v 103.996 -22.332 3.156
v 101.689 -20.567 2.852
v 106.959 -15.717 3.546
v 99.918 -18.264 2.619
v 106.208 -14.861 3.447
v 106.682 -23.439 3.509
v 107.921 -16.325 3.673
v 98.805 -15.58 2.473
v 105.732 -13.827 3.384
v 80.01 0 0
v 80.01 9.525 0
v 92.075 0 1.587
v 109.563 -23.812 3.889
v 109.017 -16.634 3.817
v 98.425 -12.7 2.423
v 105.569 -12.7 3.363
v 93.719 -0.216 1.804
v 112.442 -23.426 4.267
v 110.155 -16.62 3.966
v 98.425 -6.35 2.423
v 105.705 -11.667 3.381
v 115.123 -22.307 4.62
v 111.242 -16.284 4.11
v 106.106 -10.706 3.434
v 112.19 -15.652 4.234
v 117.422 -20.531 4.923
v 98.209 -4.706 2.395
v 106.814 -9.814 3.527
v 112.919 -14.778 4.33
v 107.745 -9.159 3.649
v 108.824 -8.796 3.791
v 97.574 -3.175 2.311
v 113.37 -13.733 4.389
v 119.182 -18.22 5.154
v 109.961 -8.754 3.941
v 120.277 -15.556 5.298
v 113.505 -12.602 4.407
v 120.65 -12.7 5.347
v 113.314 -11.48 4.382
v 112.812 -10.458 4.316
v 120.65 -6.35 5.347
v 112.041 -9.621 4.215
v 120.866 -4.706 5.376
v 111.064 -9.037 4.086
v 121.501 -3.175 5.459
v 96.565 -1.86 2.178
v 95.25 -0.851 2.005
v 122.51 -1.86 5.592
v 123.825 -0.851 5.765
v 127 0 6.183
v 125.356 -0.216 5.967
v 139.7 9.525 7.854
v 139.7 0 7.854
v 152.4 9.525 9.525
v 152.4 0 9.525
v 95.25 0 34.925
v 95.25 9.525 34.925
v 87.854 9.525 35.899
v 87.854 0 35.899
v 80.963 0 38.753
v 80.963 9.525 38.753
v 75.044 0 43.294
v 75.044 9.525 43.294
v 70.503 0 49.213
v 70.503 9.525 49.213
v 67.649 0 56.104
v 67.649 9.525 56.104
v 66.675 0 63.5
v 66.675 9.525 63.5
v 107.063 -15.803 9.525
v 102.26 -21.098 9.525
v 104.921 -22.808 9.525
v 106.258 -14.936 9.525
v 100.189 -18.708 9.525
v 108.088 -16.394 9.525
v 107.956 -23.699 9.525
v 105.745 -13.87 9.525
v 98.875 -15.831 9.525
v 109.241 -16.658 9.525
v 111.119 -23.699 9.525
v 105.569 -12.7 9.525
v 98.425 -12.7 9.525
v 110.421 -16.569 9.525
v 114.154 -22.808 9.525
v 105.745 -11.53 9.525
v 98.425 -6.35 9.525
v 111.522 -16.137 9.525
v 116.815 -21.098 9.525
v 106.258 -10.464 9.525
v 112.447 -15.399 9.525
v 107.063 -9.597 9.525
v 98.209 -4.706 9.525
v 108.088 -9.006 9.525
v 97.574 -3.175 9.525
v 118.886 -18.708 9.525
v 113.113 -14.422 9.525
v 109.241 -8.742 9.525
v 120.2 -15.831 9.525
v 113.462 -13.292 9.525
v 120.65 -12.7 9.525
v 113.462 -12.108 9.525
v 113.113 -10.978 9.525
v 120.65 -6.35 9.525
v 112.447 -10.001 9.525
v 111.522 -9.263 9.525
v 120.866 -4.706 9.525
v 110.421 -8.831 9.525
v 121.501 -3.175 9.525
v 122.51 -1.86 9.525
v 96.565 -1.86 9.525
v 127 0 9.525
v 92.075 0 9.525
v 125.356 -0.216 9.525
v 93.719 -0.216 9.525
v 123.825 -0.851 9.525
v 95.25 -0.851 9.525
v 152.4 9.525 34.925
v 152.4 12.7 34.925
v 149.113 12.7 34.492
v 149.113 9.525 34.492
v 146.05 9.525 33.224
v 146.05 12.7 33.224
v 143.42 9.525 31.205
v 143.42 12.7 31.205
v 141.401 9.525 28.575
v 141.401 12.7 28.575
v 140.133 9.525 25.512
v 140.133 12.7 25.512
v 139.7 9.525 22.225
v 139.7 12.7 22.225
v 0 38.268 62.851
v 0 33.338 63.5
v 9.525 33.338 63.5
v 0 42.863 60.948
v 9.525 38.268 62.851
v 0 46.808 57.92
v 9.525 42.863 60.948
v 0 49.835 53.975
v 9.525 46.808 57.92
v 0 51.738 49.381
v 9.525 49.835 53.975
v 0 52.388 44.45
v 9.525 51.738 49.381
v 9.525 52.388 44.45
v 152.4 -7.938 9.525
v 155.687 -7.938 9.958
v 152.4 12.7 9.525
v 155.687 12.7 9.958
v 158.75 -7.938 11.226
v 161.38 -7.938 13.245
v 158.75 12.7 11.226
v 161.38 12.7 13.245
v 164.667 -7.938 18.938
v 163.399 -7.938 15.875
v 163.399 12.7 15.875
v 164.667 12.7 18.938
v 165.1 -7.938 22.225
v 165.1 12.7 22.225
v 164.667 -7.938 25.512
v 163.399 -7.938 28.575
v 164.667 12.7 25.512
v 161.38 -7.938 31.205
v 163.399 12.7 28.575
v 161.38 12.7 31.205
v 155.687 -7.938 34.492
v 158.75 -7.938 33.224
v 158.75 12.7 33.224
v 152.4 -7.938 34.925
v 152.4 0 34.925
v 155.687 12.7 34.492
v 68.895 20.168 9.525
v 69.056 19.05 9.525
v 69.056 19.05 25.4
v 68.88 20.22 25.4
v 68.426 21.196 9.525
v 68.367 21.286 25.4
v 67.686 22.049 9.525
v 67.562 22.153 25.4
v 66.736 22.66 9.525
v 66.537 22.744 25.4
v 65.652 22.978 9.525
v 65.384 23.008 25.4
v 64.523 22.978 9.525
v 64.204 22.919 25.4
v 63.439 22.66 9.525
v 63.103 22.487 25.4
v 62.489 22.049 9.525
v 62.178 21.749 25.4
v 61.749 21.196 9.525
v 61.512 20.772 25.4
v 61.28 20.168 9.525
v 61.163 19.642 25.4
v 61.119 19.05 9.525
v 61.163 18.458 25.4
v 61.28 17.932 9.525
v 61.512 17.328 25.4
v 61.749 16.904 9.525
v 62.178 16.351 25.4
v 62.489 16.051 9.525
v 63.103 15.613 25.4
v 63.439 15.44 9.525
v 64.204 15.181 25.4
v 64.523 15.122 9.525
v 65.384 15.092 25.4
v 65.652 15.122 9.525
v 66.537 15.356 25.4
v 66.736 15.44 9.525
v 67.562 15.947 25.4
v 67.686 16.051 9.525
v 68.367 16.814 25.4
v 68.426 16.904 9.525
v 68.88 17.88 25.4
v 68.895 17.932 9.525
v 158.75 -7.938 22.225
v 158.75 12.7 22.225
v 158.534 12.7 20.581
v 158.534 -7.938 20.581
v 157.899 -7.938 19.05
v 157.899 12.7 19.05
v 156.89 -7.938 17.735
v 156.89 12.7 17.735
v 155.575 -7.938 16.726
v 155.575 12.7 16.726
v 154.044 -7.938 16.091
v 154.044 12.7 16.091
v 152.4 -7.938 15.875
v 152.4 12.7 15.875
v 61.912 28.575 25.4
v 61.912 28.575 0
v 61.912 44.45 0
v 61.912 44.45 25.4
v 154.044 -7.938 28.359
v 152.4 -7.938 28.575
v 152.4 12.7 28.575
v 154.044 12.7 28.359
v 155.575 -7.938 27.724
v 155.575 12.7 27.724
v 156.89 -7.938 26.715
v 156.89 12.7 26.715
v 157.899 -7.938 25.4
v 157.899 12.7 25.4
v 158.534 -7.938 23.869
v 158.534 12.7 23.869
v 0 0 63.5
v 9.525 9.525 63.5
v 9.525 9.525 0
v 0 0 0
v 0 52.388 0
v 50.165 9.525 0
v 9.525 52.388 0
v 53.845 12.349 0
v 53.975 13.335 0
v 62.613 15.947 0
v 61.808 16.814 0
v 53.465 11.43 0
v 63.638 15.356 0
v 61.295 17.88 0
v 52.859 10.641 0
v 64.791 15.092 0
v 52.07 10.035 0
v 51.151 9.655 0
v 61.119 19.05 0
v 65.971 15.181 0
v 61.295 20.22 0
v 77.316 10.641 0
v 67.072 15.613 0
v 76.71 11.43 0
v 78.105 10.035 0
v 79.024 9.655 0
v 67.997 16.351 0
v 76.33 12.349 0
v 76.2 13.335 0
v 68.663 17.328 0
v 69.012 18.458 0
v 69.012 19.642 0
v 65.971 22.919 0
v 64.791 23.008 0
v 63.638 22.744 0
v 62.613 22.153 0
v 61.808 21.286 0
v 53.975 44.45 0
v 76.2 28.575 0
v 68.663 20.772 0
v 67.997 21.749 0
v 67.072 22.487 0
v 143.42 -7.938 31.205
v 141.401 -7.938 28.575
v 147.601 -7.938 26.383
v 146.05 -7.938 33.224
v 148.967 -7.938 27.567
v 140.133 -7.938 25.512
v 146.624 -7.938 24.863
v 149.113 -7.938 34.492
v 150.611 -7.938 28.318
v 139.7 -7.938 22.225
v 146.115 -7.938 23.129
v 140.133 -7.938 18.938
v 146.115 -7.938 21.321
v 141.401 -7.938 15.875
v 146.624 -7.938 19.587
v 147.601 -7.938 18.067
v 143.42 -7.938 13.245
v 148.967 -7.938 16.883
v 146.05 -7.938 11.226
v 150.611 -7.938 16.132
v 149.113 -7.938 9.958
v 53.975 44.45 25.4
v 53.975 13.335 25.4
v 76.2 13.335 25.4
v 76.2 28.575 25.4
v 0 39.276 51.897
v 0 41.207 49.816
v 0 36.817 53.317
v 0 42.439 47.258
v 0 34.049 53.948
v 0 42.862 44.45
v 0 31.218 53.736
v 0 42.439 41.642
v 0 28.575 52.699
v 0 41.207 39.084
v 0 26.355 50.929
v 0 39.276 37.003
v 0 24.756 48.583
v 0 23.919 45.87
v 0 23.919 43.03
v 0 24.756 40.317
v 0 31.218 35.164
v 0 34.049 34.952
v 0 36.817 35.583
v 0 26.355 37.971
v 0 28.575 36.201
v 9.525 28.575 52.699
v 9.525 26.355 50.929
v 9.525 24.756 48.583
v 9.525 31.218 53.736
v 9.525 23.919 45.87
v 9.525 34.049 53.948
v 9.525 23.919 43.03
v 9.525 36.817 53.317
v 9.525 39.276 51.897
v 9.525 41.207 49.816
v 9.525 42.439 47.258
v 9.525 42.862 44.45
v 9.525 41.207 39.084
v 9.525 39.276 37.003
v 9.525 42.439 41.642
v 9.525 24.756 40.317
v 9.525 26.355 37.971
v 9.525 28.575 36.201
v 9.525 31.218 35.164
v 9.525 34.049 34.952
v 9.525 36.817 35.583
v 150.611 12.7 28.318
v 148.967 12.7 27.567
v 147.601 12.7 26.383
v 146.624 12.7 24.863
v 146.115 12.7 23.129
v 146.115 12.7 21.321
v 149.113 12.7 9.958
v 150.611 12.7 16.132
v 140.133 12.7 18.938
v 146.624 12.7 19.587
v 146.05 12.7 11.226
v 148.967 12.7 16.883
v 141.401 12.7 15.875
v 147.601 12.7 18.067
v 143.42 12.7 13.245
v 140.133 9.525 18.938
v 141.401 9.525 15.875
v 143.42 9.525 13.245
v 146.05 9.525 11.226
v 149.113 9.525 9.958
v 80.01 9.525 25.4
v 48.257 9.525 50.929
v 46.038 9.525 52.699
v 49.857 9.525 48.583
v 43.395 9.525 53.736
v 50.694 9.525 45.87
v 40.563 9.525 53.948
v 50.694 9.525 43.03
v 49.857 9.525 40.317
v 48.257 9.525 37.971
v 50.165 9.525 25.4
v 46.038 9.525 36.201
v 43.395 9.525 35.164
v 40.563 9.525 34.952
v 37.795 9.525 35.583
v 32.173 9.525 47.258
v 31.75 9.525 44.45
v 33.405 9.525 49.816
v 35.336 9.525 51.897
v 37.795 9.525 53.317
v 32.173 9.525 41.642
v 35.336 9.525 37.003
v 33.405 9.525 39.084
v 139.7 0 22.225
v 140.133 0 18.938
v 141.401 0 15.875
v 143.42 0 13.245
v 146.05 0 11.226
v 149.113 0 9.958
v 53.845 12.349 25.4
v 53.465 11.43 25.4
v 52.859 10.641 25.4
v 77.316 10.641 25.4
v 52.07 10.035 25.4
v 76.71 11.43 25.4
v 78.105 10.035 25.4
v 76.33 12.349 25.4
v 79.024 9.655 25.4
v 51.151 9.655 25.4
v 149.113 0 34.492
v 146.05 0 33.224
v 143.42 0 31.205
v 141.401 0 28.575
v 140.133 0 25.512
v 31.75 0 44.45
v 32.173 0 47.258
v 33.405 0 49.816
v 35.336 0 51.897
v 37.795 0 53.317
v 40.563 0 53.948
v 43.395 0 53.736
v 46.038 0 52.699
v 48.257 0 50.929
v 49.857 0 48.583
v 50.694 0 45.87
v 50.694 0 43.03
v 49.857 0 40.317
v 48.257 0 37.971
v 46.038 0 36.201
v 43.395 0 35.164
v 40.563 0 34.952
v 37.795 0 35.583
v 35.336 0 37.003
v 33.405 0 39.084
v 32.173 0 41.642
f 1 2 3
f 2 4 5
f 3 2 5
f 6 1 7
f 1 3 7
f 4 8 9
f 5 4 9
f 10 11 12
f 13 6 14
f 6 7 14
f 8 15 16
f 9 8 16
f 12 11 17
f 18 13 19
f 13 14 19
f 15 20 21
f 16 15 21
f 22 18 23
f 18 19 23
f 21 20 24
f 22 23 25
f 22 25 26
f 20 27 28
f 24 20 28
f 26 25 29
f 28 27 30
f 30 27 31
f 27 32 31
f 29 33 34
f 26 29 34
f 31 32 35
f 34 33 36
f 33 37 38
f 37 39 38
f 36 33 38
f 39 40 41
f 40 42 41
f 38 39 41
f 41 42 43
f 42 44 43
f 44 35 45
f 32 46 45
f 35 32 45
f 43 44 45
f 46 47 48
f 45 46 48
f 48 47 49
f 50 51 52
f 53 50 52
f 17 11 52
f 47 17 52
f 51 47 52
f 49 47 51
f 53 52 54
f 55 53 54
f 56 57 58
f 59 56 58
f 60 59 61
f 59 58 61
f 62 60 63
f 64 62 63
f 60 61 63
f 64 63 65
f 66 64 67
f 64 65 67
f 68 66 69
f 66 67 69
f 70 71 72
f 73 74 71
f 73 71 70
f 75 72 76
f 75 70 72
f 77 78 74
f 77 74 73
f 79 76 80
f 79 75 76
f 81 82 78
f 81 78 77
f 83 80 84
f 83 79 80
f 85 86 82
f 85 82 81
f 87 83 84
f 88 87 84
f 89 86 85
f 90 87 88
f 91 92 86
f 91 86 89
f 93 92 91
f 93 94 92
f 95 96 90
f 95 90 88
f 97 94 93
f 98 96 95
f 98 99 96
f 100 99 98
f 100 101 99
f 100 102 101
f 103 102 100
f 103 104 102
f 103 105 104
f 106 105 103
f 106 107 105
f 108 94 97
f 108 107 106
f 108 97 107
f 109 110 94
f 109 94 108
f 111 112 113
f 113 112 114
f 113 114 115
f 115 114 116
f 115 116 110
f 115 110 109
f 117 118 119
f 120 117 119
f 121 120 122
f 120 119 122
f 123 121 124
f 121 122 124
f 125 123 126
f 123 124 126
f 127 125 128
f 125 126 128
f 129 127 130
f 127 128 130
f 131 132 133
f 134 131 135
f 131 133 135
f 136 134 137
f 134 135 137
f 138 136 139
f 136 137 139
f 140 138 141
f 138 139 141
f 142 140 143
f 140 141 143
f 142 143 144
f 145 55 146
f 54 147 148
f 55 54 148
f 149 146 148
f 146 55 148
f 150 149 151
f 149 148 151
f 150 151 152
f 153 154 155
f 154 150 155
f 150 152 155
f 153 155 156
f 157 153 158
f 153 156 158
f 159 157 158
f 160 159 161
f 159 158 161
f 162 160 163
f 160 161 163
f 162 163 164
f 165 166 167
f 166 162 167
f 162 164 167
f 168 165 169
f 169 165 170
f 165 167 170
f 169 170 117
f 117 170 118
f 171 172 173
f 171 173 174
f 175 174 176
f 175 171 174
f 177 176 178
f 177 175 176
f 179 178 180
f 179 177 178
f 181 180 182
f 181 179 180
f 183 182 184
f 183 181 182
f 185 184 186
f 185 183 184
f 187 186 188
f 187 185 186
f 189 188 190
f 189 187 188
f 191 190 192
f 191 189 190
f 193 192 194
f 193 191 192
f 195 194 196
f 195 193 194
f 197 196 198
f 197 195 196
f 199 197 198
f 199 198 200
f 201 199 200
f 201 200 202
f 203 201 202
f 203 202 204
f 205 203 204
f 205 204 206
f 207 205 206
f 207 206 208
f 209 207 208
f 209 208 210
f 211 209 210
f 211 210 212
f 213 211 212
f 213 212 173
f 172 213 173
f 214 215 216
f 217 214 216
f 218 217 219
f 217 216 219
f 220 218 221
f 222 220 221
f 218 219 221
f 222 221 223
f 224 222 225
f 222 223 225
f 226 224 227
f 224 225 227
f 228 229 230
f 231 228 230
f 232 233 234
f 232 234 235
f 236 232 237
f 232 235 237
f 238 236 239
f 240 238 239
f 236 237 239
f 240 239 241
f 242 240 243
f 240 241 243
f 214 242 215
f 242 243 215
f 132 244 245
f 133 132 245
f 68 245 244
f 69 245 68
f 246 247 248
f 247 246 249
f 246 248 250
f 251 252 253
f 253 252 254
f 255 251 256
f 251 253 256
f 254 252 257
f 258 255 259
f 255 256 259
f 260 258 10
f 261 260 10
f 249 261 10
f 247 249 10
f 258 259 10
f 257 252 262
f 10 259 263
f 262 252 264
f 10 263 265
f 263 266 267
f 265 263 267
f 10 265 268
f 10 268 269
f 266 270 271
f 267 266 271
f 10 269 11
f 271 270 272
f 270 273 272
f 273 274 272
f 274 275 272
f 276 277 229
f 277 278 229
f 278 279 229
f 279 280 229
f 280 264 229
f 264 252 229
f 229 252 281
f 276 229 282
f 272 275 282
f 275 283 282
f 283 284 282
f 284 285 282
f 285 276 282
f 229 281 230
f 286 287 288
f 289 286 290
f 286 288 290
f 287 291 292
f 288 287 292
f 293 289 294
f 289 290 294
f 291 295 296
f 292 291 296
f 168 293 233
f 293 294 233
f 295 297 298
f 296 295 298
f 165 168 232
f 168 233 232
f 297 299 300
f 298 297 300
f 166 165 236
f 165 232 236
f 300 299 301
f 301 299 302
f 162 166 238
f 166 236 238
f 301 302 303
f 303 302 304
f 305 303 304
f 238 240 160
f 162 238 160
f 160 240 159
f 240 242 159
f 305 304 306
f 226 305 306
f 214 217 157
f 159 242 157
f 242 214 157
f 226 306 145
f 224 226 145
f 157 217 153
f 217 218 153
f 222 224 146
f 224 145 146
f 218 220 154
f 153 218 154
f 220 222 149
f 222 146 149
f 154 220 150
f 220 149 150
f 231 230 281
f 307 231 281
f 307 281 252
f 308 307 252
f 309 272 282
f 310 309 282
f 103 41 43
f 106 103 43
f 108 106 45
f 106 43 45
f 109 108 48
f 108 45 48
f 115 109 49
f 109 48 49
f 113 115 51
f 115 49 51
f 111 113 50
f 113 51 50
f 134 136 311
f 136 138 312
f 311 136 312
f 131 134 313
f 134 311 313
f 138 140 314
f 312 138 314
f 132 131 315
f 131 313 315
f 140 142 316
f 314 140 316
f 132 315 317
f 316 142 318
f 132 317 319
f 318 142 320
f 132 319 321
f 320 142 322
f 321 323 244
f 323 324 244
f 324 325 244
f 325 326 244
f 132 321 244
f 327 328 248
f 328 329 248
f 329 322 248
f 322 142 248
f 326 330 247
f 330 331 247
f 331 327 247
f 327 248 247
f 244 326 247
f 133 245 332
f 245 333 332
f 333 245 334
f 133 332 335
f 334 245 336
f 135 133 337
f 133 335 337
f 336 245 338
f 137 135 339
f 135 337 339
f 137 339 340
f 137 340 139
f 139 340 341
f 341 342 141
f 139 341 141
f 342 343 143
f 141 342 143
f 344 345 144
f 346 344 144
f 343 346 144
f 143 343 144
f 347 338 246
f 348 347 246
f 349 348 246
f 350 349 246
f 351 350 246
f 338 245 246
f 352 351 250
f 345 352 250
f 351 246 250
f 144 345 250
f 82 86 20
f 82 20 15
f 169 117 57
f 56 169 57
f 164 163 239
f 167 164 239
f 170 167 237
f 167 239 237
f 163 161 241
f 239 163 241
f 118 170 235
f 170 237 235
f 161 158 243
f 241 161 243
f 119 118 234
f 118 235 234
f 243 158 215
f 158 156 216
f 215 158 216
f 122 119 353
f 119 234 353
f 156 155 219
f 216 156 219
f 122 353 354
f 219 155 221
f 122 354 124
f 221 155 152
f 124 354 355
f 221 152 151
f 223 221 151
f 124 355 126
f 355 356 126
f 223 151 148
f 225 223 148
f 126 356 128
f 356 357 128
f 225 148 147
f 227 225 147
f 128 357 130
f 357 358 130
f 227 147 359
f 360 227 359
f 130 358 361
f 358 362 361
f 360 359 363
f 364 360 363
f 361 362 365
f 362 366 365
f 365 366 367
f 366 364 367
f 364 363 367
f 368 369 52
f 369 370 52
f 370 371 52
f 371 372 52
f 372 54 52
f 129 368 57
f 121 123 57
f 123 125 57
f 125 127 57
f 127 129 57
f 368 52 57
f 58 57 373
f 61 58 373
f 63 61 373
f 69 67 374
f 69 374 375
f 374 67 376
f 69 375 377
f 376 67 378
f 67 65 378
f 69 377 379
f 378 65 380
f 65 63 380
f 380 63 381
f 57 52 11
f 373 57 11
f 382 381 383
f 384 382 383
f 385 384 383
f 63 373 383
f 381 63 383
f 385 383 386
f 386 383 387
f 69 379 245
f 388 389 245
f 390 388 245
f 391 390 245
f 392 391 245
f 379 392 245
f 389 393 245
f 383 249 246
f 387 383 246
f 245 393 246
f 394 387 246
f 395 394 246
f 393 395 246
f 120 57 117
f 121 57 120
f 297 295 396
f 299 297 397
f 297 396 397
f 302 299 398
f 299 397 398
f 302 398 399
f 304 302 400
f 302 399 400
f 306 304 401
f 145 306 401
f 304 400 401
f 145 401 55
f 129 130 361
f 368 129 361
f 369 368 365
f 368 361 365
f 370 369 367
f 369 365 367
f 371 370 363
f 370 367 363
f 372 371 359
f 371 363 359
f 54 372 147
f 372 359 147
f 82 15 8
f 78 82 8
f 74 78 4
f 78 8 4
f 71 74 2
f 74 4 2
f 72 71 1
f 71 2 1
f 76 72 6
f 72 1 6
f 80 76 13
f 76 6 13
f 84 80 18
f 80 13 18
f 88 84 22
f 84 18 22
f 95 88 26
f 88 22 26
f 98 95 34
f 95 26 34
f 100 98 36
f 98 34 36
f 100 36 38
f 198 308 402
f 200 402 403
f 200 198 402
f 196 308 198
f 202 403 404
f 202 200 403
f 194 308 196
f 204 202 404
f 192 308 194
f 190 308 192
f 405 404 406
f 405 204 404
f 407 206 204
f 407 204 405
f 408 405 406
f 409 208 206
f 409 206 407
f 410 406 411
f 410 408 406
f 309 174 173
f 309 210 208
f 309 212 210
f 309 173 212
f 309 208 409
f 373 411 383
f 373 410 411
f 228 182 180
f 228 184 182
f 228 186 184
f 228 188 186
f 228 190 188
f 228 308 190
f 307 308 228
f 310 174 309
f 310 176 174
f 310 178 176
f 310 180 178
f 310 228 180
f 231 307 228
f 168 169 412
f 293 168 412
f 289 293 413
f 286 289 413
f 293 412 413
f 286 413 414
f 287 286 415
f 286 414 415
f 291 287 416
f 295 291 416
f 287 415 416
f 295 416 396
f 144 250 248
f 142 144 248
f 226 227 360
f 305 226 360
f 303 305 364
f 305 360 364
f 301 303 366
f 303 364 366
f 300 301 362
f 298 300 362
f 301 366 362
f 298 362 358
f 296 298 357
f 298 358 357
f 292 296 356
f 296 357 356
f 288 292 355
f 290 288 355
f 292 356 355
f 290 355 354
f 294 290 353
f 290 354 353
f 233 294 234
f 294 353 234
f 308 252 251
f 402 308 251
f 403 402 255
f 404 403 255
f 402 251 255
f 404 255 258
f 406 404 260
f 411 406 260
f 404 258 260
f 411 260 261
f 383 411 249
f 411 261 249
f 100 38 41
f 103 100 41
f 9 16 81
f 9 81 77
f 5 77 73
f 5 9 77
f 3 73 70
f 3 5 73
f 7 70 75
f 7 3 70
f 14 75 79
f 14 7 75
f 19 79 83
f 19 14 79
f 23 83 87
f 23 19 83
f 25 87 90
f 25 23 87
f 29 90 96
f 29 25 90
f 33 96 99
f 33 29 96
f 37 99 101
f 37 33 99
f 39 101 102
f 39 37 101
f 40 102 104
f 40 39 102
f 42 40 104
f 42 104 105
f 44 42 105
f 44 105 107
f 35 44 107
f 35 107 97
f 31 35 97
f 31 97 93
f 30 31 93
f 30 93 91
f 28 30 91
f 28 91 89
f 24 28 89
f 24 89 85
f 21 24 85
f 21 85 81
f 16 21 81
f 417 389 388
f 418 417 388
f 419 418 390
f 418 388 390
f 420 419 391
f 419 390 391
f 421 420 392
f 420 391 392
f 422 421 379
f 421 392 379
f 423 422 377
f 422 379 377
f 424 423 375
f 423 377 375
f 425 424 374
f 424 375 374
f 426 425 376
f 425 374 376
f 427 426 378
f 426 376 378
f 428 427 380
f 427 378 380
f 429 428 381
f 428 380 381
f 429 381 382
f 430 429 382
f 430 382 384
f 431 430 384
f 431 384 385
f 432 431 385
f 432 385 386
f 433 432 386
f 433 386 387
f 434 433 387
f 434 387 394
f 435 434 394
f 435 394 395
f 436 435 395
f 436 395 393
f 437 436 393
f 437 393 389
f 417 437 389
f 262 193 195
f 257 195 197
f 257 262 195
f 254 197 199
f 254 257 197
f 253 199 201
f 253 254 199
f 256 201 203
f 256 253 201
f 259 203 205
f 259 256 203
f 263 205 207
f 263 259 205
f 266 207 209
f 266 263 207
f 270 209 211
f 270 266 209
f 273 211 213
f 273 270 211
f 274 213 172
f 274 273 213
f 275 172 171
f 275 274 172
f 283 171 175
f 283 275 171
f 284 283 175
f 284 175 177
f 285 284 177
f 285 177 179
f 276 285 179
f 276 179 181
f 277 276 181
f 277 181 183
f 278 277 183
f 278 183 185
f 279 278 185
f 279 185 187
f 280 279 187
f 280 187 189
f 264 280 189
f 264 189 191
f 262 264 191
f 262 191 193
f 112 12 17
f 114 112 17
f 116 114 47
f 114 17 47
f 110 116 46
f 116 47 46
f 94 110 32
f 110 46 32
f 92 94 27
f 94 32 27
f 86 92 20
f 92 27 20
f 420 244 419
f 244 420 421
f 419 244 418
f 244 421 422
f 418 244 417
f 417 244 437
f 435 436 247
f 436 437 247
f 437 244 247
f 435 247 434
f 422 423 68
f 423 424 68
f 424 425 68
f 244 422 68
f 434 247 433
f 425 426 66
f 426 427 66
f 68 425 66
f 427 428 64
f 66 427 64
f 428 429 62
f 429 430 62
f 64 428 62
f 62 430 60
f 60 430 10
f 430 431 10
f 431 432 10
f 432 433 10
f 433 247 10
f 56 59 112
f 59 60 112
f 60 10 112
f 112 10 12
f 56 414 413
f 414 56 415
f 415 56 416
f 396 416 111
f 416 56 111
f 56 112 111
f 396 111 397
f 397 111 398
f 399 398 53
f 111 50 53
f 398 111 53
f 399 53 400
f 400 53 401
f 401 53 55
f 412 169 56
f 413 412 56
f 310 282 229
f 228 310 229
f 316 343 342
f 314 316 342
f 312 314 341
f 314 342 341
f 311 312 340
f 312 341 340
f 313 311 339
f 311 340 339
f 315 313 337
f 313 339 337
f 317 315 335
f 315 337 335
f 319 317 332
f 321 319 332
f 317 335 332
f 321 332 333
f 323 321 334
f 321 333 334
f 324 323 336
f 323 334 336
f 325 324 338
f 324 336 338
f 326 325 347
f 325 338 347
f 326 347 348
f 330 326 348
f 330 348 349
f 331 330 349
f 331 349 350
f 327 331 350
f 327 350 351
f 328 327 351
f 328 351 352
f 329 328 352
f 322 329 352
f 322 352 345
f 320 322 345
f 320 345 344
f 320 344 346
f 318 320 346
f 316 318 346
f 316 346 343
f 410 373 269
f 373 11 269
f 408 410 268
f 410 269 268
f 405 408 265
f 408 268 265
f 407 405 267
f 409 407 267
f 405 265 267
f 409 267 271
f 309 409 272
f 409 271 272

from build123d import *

# Parameters (mm, degrees)
SKETCH1_R               = 3.96875
BOSS_EXTRUDE1_DEPTH     = 9.525
BOSS_EXTRUDE4_START     = 9.525
BOSS_EXTRUDE4_OUTLINE_R = 3.96875
BOSS_EXTRUDE4_DEPTH     = 15.875
BOSS_EXTRUDE5_START     = 25.4
BOSS_EXTRUDE5_DEPTH     = 38.1
SKETCH4_R               = 9.525
CUT_EXTRUDE1_DEPTH      = 177.01216089
SKETCH2_R               = 9.525
SKETCH2_W               = 12.7
SKETCH2_H               = 28.575
CUT_EXTRUDE2_DEPTH      = 182.288051609
CUT_EXTRUDE3_DEPTH      = 3.175
CUT_EXTRUDE4_START      = -12.7
CUT_EXTRUDE4_DEPTH      = 7.9375


# Read off the part's stored shape, not the designer's step: Boss-Extrude4, Boss-Extrude5
with BuildPart() as part:
    # Sketch1 → Boss-Extrude1 (new body)
    with BuildSketch(Plane.XY):
        with BuildLine():
            Line((0, 0), (92.075, 0))
            ThreePointArc((92.075, 0), (96.565128061, -1.859871939), (98.425, -6.35))
            Line((98.425, -6.35), (98.425, -12.7))
            ThreePointArc((98.425, -12.7), (109.5375, -23.8125), (120.65, -12.7))
            Line((120.65, -12.7), (120.65, -6.35))
            ThreePointArc((120.65, -6.35), (122.509871939, -1.859871939), (127, 0))
            Line((127, 0), (139.7, 0))
            Line((139.7, 0), (139.7, -7.9375))
            Line((139.7, -7.9375), (165.1, -7.9375))
            Line((165.1, -7.9375), (165.1, 12.7))
            Line((165.1, 12.7), (139.7, 12.7))
            Line((139.7, 12.7), (139.7, 9.525))
            Line((139.7, 9.525), (80.01, 9.525))
            ThreePointArc((80.01, 9.525), (77.315923164, 10.640923164), (76.2, 13.335))
            Line((76.2, 13.335), (76.2, 28.575))
            Line((76.2, 28.575), (61.9125, 28.575))
            Line((61.9125, 28.575), (61.9125, 44.45))
            Line((61.9125, 44.45), (53.975, 44.45))
            Line((53.975, 44.45), (53.975, 13.335))
            ThreePointArc((53.975, 13.335), (52.859076836, 10.640923164), (50.165, 9.525))
            Line((50.165, 9.525), (9.525, 9.525))
            Line((9.525, 9.525), (9.525, 52.3875))
            Line((9.525, 52.3875), (0, 52.3875))
            Line((0, 52.3875), (0, 0))
        make_face()
        with Locations(Location((109.5375, -12.7, 0), (0, 0, 180))):
            Circle(SKETCH1_R, mode=Mode.SUBTRACT)
        with Locations(Location((65.0875, 19.05, 0), (0, 0, 180))):
            Circle(SKETCH1_R, mode=Mode.SUBTRACT)
    extrude(amount=BOSS_EXTRUDE1_DEPTH)

    # Boss-Extrude4 outline → Boss-Extrude4 (add)
    with BuildSketch(Plane.XY.offset(BOSS_EXTRUDE4_START)):
        with BuildLine():
            Line((9.525, 52.3875), (0, 52.3875))
            Line((0, 52.3875), (0, 0))
            Line((0, 0), (139.7, 0))
            Line((139.7, 0), (139.7, -7.9375))
            Line((139.7, -7.9375), (165.1, -7.9375))
            Line((165.1, -7.9375), (165.1, 12.7))
            Line((165.1, 12.7), (139.7, 12.7))
            Line((139.7, 12.7), (139.7, 9.525))
            Line((139.7, 9.525), (80.01, 9.525))
            ThreePointArc((80.01, 9.525), (77.315923164, 10.640923164), (76.2, 13.335))
            Line((76.2, 13.335), (76.2, 28.575))
            Line((76.2, 28.575), (61.9125, 28.575))
            Line((61.9125, 28.575), (61.9125, 44.45))
            Line((61.9125, 44.45), (53.975, 44.45))
            Line((53.975, 44.45), (53.975, 13.335))
            ThreePointArc((53.975, 13.335), (52.859076836, 10.640923164), (50.165, 9.525))
            Line((50.165, 9.525), (9.525, 9.525))
            Line((9.525, 9.525), (9.525, 52.3875))
        make_face()
        with Locations((65.0875, 19.05)):
            Circle(BOSS_EXTRUDE4_OUTLINE_R, mode=Mode.SUBTRACT)
    extrude(amount=BOSS_EXTRUDE4_DEPTH)

    # Boss-Extrude5 outline → Boss-Extrude5 (add)
    with BuildSketch(Plane.XY.offset(BOSS_EXTRUDE5_START)):
        Polygon((9.525, 52.3875), (0, 52.3875), (0, 0), (139.7, 0), (139.7, -7.9375), (165.1, -7.9375), (165.1, 12.7), (139.7, 12.7), (139.7, 9.525), (9.525, 9.525), align=None)
    extrude(amount=BOSS_EXTRUDE5_DEPTH)

    # Sketch4 → Cut-Extrude1 (cut, through all)
    with BuildSketch(Plane(origin=(9.525, 0, 0), x_dir=(0, 0, -1), z_dir=(1, 0, 0))):
        with BuildLine():
            Line((-63.5, 52.3875), (-63.5, 33.3375))
            ThreePointArc((-63.5, 33.3375), (-57.920384182, 46.807884182), (-44.45, 52.3875))
            Line((-44.45, 52.3875), (-63.5, 52.3875))
        make_face()
        with Locations(Location((-44.45, 33.3375, 0), (0, 0, 90))):
            Circle(SKETCH4_R)
    extrude(amount=-CUT_EXTRUDE1_DEPTH, mode=Mode.SUBTRACT)

    # Sketch2 → Cut-Extrude2 (cut, through all)
    with BuildSketch(Plane(origin=(0, 12.7, 0), x_dir=(1, 0, 0), z_dir=(0, 1, 0))):
        with Locations(Location((41.275, -44.45, 0), (0, 0, 180))):
            Circle(SKETCH2_R)
        with BuildLine():
            ThreePointArc((123.825, -63.5), (115.455576272, -43.294423728), (95.25, -34.925))
            ThreePointArc((95.25, -34.925), (75.044423728, -43.294423728), (66.675, -63.5))
            Line((66.675, -63.5), (123.825, -63.5))
        make_face()
        with BuildLine():
            ThreePointArc((66.675, -63.5), (95.25, -92.075), (123.825, -63.5))
            Line((123.825, -63.5), (66.675, -63.5))
        make_face()
        with BuildLine():
            Line((139.7, -63.5), (139.7, -34.925))
            Line((139.7, -34.925), (95.25, -34.925))
            ThreePointArc((95.25, -34.925), (115.455576272, -43.294423728), (123.825, -63.5))
            Line((123.825, -63.5), (139.7, -63.5))
        make_face()
        with BuildLine():
            Line((165.1, -63.5), (165.1, -22.225))
            ThreePointArc((165.1, -22.225), (161.380256121, -31.205256121), (152.4, -34.925))
            Line((152.4, -34.925), (152.4, -63.5))
            Line((152.4, -63.5), (165.1, -63.5))
        make_face()
        with Locations((146.05, -49.2125)):
            Rectangle(SKETCH2_W, SKETCH2_H)
        with BuildLine():
            Line((165.1, 0), (152.4, 0))
            Line((152.4, 0), (152.4, -9.525))
            ThreePointArc((152.4, -9.525), (161.380256121, -13.244743879), (165.1, -22.225))
            Line((165.1, -22.225), (165.1, 0))
        make_face()
        Polygon((152.4, -9.525), (152.4, 0), (139.7, 0), (139.7, -7.853947368), align=None)
        Polygon((139.7, -7.853947368), (139.7, 0), (80.01, 0), align=None)
        with BuildLine():
            ThreePointArc((158.75, -22.225), (156.890128061, -17.734871939), (152.4, -15.875))
            Line((152.4, -15.875), (152.4, -28.575))
            ThreePointArc((152.4, -28.575), (156.890128061, -26.715128061), (158.75, -22.225))
        make_face()
        with BuildLine():
            Line((152.4, -28.575), (152.4, -15.875))
            ThreePointArc((152.4, -15.875), (146.05, -22.225), (152.4, -28.575))
        make_face()
    extrude(amount=-CUT_EXTRUDE2_DEPTH, mode=Mode.SUBTRACT)

    # Sketch2<3> → Cut-Extrude3 (cut)
    with BuildSketch(Plane(origin=(0, 12.7, 0), x_dir=(1, 0, 0), z_dir=(0, 1, 0))):
        with BuildLine():
            ThreePointArc((152.4, -34.925), (143.419743879, -31.205256121), (139.7, -22.225))
            Line((139.7, -22.225), (139.7, -34.925))
            Line((139.7, -34.925), (152.4, -34.925))
        make_face()
        with BuildLine():
            ThreePointArc((139.7, -22.225), (143.419743879, -13.244743879), (152.4, -9.525))
            Line((152.4, -9.525), (139.7, -7.853947368))
            Line((139.7, -7.853947368), (139.7, -22.225))
        make_face()
    extrude(amount=-CUT_EXTRUDE3_DEPTH, mode=Mode.SUBTRACT)

    # Sketch2<5> → Cut-Extrude4 (cut)
    with BuildSketch(Plane(origin=(0, 12.7, 0), x_dir=(1, 0, 0), z_dir=(0, 1, 0)).offset(CUT_EXTRUDE4_START)):
        with BuildLine():
            ThreePointArc((139.7, -22.225), (143.419743879, -13.244743879), (152.4, -9.525))
            Line((152.4, -9.525), (139.7, -7.853947368))
            Line((139.7, -7.853947368), (139.7, -22.225))
        make_face()
        with BuildLine():
            ThreePointArc((152.4, -34.925), (143.419743879, -31.205256121), (139.7, -22.225))
            Line((139.7, -22.225), (139.7, -34.925))
            Line((139.7, -34.925), (152.4, -34.925))
        make_face()
    extrude(amount=-CUT_EXTRUDE4_DEPTH, mode=Mode.SUBTRACT)


solid = part.part
